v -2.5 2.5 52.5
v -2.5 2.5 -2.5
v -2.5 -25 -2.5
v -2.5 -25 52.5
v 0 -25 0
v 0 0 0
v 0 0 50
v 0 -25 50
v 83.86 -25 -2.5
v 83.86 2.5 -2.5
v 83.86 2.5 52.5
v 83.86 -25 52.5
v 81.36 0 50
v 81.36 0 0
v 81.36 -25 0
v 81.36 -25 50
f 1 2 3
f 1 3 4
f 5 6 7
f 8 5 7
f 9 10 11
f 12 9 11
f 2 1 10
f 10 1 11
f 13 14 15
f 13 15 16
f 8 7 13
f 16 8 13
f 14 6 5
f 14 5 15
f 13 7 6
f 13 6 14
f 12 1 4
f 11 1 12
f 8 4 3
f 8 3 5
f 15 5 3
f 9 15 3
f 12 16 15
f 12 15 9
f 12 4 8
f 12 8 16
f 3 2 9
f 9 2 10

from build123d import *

# Parameters (mm, degrees)
F0_W     = 81.3596632027
F0_H     = 50
F1_DEPTH = 25
F2_T     = 2.5


with BuildPart() as f1:
    # F0 (on Front) → F1 (new body)
    with BuildSketch(Plane.XZ):
        with Locations((40.6798316013, 25)):
            Rectangle(F0_W, F0_H)
    extrude(amount=F1_DEPTH)

    # F2
    f2_openings = [f1.faces().sort_by_distance(p)[0] for p in [
        (40.679832, -25, 25),
    ]]
    offset(amount=F2_T, openings=f2_openings, kind=Kind.INTERSECTION)


solid = f1.part
